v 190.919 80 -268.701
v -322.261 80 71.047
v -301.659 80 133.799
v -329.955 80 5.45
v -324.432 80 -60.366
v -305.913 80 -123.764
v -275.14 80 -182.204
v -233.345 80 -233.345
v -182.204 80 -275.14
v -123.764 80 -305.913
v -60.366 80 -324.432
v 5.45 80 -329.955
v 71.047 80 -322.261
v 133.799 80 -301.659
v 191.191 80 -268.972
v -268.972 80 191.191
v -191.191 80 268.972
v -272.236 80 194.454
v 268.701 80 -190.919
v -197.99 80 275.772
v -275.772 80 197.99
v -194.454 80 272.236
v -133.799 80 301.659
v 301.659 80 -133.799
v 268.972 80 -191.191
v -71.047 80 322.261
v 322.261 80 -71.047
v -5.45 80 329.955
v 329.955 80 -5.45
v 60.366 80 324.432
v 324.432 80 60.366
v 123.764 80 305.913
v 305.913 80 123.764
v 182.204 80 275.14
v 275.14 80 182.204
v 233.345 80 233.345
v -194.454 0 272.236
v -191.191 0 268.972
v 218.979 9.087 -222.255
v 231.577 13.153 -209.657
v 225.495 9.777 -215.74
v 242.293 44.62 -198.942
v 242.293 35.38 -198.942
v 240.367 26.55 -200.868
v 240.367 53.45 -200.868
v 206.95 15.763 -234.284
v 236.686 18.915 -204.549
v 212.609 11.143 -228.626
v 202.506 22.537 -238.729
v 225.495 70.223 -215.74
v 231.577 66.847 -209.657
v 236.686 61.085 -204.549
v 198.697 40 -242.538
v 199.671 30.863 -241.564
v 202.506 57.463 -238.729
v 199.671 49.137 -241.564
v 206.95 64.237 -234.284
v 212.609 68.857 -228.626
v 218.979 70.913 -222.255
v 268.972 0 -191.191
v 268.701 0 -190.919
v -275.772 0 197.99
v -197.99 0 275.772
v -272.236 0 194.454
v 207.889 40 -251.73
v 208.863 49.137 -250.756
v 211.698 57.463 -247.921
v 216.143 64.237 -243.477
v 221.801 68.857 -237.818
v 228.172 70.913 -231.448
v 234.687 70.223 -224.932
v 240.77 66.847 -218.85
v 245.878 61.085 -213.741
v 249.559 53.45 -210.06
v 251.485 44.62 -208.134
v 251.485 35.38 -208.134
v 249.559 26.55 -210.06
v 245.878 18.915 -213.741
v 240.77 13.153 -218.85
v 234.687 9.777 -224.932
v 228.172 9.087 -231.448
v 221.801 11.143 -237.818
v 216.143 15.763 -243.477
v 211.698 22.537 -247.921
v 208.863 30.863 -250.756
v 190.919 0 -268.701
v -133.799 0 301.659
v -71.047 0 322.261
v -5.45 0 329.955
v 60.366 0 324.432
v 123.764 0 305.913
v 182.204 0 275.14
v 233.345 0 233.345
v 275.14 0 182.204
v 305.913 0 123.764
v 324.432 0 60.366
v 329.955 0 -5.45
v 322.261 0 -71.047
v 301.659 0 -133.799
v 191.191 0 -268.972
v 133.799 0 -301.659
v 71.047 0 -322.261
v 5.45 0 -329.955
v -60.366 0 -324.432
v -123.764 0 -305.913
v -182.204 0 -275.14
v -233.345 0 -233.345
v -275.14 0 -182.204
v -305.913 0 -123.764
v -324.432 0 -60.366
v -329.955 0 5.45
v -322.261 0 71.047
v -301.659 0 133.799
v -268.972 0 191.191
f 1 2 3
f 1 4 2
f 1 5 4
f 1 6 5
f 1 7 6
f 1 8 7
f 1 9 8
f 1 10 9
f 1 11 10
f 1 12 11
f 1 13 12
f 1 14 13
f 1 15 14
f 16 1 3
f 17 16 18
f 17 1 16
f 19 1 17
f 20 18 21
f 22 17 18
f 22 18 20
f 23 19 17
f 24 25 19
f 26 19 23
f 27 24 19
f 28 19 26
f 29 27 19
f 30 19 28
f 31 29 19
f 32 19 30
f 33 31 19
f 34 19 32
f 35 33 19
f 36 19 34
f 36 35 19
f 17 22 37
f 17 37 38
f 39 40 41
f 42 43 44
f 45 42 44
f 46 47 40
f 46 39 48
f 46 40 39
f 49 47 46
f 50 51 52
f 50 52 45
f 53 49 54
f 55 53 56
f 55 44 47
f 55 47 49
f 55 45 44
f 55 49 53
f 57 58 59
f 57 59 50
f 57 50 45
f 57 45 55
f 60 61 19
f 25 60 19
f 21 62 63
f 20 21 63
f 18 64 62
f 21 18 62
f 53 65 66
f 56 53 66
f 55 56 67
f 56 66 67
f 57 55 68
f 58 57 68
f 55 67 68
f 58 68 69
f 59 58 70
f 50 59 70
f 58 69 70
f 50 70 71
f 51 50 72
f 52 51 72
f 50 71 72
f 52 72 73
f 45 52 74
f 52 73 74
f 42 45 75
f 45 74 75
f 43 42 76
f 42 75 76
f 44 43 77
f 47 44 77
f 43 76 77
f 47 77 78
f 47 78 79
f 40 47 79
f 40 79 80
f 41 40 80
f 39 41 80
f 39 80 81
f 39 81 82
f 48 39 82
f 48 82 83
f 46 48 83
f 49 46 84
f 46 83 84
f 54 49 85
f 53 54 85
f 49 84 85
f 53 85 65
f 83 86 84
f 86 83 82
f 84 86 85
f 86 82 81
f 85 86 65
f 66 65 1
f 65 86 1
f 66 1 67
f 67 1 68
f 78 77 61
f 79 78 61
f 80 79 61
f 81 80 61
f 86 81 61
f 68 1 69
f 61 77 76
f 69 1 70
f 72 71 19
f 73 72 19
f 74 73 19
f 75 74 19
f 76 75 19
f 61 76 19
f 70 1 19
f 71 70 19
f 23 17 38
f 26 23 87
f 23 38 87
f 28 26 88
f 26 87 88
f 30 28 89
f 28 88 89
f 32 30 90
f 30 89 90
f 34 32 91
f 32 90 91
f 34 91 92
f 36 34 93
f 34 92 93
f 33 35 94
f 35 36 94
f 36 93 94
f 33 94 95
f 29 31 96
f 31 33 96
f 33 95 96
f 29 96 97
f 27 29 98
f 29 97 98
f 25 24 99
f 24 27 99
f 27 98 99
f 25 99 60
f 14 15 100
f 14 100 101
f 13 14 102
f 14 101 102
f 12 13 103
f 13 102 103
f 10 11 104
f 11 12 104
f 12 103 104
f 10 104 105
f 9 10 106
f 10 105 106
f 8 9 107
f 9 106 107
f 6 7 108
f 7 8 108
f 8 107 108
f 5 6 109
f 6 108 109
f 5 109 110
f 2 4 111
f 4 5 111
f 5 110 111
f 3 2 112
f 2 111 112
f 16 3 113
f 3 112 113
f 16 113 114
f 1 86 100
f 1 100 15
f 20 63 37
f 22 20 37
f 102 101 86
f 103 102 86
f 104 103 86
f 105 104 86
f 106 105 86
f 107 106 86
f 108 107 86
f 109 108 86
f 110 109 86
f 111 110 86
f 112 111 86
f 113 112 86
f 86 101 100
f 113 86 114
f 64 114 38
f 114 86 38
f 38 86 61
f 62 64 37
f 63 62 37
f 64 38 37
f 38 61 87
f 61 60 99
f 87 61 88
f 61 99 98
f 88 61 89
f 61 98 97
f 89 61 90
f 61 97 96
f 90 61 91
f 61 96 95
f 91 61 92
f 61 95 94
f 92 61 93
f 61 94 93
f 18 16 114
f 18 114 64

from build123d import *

# Parameters (mm, degrees)
SKETCH1_R           = 330
BOSS_EXTRUDE1_DEPTH = 80
BOSS_EXTRUDE2_START = -80
BOSS_EXTRUDE2_DEPTH = 80
SKETCH7_W           = 110
SKETCH7_H           = 80
BOSS_EXTRUDE3_DEPTH = 650.38438807
SKETCH9_W           = 110
SKETCH9_H           = 80
CUT_EXTRUDE4_DEPTH  = 12
SKETCH10_R          = 31
CUT_EXTRUDE5_DEPTH  = 13


with BuildPart() as part:
    # Sketch1 → Boss-Extrude1 (new body)
    with BuildSketch(Plane(origin=(0, 0, 0), x_dir=(1, 0, 0), z_dir=(0, 1, 0))):
        with Locations(Location((0, 0, 0), (0, 0, 270))):
            Circle(SKETCH1_R)
    extrude(amount=BOSS_EXTRUDE1_DEPTH)

    # Sketch6 → Boss-Extrude2 (add)
    with BuildSketch(Plane(origin=(0, 80, 0), x_dir=(1, 0, 0), z_dir=(0, 1, 0)).offset(BOSS_EXTRUDE2_START)):
        with BuildLine():
            Line((-272.236110757, -194.454364826), (-275.771644663, -197.989898732))
            Line((-275.771644663, -197.989898732), (-197.989898732, -275.771644663))
            Line((-197.989898732, -275.771644663), (-194.454364826, -272.236110757))
            Line((-194.454364826, -272.236110757), (-191.190634332, -268.972380262))
            ThreePointArc((-191.190634332, -268.972380262), (-233.345237792, -233.345237792), (-268.972380262, -191.190634332))
            Line((-268.972380262, -191.190634332), (-272.236110757, -194.454364826))
        make_face()
    extrude(amount=BOSS_EXTRUDE2_DEPTH)

    # Sketch7 → Boss-Extrude3 (add)
    with BuildSketch(Plane(origin=(229.809703886, 0, -229.809703886), x_dir=(0.7071067811865476, 0, 0.7071067811865476), z_dir=(-0.7071067811865476, 0, 0.7071067811865476))):
        with Locations((0, 40)):
            Rectangle(SKETCH7_W, SKETCH7_H)
    extrude(amount=BOSS_EXTRUDE3_DEPTH)

    # Sketch9 → Cut-Extrude4 (cut)
    with BuildSketch(Plane(origin=(229.809703886, 0, -229.809703886), x_dir=(0.7071067811865476, 0, 0.7071067811865476), z_dir=(-0.7071067811865476, 0, 0.7071067811865476))):
        with Locations((0, 40)):
            Rectangle(SKETCH9_W, SKETCH9_H)
    extrude(amount=-CUT_EXTRUDE4_DEPTH, mode=Mode.SUBTRACT)

    # Sketch10 → Cut-Extrude5 (cut)
    with BuildSketch(Plane(origin=(229.809703886, 0, -229.809703886), x_dir=(-0.7071067811865475, 0, -0.7071067811865477), z_dir=(0.7071067811865477, 0, -0.7071067811865475))):
        with Locations((0, 40)):
            Circle(SKETCH10_R)
    extrude(amount=-CUT_EXTRUDE5_DEPTH, mode=Mode.SUBTRACT)


solid = part.part
